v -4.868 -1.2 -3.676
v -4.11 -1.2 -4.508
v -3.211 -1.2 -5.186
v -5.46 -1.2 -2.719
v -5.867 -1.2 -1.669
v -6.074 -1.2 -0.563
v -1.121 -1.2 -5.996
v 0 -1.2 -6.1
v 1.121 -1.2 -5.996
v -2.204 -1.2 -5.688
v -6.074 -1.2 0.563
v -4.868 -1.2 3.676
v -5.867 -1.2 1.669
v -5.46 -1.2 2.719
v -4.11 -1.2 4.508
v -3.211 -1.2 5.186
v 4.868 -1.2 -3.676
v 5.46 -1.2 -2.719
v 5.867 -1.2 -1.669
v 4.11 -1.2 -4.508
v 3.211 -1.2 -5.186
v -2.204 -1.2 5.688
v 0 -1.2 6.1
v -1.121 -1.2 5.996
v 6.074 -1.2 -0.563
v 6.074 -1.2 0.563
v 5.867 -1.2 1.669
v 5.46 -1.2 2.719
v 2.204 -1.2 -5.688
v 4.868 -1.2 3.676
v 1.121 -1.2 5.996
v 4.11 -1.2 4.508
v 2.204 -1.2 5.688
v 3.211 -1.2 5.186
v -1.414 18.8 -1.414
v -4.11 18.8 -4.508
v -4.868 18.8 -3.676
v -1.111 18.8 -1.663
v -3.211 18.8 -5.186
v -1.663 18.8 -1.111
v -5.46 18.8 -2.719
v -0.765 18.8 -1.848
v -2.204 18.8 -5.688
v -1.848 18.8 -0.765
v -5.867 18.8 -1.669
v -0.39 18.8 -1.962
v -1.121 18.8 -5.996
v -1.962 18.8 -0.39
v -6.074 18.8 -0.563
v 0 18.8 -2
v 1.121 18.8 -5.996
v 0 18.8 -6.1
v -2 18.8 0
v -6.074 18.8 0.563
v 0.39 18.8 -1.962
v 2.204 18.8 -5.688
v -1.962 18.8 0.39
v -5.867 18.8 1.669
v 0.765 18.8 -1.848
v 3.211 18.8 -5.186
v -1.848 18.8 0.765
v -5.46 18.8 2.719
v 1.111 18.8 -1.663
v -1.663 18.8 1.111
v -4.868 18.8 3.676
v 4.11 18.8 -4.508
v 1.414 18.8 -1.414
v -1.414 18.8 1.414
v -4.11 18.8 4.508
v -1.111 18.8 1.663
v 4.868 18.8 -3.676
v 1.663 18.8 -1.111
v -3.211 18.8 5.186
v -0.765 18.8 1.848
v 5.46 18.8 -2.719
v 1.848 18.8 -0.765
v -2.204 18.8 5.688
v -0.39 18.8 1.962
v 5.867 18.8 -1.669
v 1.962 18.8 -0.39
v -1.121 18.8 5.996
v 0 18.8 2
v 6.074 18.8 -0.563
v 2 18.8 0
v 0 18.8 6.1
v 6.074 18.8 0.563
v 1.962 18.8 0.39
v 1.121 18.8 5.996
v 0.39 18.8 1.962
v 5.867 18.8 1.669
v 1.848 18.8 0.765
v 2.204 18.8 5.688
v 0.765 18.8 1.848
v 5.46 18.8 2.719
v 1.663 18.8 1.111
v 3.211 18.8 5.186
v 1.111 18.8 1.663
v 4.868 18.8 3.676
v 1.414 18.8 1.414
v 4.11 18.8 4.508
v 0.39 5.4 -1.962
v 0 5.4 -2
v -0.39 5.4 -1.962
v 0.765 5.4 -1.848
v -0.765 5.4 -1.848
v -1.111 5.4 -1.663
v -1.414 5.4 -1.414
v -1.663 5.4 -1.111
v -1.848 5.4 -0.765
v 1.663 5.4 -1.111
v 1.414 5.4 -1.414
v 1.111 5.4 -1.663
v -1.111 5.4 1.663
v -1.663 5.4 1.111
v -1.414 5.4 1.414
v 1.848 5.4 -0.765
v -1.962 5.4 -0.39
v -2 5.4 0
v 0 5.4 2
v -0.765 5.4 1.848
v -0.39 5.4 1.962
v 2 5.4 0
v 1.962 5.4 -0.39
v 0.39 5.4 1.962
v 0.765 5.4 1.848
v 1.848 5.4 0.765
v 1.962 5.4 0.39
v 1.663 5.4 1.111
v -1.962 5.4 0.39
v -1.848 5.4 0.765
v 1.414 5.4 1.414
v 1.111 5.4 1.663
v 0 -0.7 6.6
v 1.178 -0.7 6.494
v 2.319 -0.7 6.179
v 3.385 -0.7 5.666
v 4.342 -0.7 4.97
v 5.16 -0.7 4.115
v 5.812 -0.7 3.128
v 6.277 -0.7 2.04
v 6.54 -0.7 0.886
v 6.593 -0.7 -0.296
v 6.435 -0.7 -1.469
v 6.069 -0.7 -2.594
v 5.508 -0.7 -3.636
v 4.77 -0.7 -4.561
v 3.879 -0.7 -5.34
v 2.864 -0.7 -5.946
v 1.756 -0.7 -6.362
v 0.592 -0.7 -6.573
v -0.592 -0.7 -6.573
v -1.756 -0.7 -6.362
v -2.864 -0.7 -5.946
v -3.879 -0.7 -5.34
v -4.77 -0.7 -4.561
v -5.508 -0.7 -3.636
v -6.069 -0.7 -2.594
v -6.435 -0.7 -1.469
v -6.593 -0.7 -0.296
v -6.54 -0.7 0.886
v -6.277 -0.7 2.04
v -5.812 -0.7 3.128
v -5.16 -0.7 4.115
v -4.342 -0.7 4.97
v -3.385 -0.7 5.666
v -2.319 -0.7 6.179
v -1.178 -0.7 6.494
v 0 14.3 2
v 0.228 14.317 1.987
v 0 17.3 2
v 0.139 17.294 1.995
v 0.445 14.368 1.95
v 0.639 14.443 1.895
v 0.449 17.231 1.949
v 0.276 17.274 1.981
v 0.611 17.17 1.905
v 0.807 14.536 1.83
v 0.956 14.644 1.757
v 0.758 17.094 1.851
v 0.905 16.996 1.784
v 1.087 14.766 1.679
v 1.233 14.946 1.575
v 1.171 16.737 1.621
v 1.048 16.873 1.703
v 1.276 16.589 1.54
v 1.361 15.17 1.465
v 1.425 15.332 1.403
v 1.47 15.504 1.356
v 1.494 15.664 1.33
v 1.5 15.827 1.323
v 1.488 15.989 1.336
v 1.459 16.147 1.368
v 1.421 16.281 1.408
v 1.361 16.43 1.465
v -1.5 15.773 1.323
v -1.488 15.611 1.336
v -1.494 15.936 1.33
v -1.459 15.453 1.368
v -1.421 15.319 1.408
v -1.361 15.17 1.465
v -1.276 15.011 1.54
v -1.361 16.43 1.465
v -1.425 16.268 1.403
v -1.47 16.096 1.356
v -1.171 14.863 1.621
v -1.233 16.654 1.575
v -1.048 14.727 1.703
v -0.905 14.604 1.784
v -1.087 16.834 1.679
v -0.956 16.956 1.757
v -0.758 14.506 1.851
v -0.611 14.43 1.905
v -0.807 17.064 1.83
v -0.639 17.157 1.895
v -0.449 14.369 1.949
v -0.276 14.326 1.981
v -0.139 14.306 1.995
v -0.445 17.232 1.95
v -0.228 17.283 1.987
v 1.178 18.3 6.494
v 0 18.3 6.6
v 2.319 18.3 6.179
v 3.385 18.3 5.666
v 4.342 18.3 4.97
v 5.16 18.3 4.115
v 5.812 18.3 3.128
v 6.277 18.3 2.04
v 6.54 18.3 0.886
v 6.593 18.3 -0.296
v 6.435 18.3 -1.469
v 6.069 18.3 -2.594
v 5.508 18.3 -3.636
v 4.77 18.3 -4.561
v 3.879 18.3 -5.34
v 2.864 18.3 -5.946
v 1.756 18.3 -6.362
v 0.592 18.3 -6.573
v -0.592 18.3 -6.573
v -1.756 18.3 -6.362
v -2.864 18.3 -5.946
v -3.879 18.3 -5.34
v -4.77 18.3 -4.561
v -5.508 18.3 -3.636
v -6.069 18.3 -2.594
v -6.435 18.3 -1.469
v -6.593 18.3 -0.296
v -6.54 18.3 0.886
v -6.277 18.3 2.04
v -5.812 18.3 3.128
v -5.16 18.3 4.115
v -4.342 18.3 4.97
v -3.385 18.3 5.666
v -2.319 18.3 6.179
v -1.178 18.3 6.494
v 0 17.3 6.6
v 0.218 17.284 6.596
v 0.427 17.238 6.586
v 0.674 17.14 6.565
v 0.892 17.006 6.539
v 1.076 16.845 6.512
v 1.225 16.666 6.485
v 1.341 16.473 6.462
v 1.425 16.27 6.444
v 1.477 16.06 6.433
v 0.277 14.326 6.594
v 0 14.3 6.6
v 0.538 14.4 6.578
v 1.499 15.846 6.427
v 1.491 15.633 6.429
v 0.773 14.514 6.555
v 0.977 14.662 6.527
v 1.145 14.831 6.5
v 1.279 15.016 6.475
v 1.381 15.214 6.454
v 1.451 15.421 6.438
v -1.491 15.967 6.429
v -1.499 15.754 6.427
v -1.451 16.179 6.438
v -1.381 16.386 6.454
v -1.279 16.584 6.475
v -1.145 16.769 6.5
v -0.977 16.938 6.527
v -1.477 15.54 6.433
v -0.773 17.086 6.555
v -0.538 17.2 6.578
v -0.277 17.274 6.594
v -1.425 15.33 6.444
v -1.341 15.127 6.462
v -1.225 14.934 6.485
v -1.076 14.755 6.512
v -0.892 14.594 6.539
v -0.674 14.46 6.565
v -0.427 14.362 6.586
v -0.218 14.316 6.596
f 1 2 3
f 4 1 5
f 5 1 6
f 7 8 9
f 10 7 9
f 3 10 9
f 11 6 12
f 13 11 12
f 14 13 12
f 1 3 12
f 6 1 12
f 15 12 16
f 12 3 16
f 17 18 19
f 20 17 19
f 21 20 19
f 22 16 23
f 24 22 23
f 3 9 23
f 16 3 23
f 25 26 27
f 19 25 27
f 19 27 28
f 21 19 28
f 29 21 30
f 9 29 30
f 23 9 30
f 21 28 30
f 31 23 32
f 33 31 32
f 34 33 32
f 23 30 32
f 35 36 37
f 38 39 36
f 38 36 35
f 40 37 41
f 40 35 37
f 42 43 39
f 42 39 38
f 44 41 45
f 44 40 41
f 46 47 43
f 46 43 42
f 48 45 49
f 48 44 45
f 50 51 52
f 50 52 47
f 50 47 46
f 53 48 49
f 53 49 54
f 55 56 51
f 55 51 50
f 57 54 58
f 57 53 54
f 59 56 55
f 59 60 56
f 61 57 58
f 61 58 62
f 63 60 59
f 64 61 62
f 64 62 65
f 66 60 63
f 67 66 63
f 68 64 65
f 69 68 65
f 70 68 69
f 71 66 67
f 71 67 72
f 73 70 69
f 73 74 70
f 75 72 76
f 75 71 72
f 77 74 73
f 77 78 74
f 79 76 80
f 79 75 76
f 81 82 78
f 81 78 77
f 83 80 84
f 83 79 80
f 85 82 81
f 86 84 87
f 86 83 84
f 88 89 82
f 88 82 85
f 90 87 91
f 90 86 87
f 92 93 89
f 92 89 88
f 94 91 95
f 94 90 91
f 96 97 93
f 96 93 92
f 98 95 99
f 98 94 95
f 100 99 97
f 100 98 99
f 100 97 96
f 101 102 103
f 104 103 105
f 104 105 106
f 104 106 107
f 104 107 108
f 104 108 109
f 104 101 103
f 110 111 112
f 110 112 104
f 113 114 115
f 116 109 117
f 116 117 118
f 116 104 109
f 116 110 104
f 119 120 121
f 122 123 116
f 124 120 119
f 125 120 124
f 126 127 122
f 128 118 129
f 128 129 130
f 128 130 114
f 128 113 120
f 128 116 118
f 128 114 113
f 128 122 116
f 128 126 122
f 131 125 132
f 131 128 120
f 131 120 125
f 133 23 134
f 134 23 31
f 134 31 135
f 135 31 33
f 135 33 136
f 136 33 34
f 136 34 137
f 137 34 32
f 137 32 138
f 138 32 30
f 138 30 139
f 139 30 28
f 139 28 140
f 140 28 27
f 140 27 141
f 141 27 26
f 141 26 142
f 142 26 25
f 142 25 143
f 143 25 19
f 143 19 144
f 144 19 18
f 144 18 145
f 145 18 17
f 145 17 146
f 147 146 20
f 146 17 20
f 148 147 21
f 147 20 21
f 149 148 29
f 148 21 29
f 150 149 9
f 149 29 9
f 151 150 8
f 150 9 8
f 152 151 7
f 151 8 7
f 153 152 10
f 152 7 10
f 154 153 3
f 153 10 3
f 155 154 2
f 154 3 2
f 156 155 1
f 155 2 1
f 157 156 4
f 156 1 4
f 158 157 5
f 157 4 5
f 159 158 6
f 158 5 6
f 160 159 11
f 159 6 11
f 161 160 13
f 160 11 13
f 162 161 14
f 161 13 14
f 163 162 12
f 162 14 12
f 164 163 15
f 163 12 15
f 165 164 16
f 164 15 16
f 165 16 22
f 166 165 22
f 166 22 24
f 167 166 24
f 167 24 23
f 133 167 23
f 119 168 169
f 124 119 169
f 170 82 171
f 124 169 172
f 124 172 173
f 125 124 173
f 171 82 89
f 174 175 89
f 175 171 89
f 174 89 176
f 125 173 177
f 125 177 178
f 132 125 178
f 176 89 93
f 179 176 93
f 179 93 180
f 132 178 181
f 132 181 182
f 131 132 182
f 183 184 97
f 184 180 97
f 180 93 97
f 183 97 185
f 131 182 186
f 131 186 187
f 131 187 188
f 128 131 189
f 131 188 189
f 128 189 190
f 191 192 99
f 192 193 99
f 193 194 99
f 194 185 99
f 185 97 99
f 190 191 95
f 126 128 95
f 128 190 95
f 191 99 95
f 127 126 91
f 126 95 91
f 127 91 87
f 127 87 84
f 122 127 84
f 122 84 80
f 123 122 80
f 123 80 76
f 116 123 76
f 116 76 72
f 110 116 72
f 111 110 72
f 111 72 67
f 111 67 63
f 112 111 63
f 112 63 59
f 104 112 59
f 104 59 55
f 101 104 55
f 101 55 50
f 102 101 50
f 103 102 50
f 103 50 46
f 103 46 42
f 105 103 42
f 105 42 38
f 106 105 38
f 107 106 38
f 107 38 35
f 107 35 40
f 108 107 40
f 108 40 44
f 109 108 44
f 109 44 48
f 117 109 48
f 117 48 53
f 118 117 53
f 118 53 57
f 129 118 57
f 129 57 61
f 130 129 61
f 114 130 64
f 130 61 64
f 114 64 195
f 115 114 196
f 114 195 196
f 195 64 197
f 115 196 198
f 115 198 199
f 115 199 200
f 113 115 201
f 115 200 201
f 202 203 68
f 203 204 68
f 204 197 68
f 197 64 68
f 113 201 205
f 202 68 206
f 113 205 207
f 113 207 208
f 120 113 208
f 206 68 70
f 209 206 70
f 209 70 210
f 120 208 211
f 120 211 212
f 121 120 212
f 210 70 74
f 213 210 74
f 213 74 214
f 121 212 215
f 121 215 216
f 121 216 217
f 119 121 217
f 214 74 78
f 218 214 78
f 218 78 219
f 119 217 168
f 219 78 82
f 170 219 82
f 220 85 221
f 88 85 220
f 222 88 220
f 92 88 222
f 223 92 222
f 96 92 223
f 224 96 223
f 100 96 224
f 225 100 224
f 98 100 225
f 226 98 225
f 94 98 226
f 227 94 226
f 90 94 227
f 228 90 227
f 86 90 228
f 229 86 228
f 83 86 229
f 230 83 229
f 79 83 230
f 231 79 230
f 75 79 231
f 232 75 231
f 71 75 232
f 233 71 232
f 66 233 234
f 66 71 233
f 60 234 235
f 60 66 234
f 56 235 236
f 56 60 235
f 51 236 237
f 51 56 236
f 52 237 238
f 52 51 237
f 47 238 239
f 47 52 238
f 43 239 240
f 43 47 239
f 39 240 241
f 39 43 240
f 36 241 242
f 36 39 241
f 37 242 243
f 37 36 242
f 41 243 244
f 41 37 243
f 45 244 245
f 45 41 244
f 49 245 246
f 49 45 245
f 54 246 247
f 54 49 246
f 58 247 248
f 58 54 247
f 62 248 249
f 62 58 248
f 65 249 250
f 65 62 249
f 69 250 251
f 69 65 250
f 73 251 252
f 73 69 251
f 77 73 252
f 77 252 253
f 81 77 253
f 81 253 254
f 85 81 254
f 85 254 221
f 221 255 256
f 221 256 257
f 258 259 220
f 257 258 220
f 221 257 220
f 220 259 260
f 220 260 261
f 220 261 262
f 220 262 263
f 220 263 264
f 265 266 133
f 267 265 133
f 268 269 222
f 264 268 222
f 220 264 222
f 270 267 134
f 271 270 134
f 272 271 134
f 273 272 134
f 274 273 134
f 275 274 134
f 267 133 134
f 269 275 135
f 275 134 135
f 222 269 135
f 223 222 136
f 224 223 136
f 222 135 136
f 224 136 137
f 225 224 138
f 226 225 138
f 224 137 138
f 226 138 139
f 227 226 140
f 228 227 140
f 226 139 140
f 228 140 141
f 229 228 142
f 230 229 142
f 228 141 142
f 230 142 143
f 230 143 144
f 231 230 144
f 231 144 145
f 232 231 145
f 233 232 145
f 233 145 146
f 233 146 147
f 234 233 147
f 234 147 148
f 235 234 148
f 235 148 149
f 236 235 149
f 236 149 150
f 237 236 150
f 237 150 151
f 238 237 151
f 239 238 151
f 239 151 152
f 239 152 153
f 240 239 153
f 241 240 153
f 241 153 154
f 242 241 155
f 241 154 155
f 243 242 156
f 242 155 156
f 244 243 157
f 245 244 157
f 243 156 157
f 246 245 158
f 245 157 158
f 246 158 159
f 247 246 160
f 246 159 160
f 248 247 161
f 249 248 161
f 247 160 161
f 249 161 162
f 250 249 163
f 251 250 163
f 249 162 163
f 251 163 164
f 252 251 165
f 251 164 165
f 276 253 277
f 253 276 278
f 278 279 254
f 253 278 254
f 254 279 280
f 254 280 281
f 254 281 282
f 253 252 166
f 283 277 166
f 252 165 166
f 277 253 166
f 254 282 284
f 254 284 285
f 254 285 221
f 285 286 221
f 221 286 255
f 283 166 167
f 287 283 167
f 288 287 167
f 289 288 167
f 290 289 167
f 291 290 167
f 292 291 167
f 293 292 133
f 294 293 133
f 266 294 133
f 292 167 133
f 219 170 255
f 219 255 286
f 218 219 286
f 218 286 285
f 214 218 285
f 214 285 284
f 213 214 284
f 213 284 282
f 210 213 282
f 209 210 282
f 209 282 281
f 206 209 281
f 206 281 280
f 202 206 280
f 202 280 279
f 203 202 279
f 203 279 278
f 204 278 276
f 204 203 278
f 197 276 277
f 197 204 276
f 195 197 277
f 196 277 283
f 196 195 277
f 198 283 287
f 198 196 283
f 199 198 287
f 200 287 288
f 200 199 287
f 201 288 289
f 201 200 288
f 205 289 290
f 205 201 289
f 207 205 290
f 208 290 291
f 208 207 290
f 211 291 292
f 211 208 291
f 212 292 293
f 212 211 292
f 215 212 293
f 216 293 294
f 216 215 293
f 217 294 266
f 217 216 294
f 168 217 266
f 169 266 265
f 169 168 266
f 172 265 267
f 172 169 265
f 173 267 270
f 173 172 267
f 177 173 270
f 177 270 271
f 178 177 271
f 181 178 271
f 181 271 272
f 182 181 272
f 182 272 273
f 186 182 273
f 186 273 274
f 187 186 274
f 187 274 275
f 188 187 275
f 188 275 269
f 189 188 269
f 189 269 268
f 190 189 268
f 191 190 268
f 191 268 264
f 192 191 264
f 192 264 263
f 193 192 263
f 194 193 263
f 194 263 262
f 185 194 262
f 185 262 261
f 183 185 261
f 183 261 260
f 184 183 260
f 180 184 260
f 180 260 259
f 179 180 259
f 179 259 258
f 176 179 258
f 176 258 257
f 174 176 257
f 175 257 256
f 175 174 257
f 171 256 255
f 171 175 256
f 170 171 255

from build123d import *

# Parameters (mm, degrees)
EXTRUDE_1_DEPTH      = 18.8
EXTRUDE_1_DEPTH_BACK = 1.2
SKETCH_1_R           = 6.6
CHAMFER_1_SIZE       = 0.5
SKETCH_2_R           = 2
CUT_EXTRUDE_1_DEPTH  = 13.4
SKETCH_3_R           = 1.5
CUT_EXTRUDE_2_DEPTH  = 13.4


with BuildPart() as part:
    # 草图1 → 凸台-拉伸1 (new, two sides: drawn at the far end of the back side and taken through both)
    with BuildSketch(Plane(origin=(0, 0, 0), x_dir=(1, 0, 0), z_dir=(0, 1, 0)).offset(-EXTRUDE_1_DEPTH_BACK)):
        with Locations(Location((0, 0, 0), (0, 0, 270))):
            Circle(SKETCH_1_R)
    extrude(amount=EXTRUDE_1_DEPTH + EXTRUDE_1_DEPTH_BACK)

    # 倒角1
    chamfer_1_edges = [part.edges().sort_by_distance(p)[0] for p in [
        (0, -1.2, -6.6),
        (0, 18.8, -6.6),
    ]]
    chamfer(chamfer_1_edges, length=CHAMFER_1_SIZE)

    # 草图2 → 切除-拉伸1 (cut)
    with BuildSketch(Plane(origin=(0, 18.8, 0), x_dir=(1, 0, 0), z_dir=(0, 1, 0))):
        with Locations(Location((0, 0, 0), (0, 0, 270))):
            Circle(SKETCH_2_R)
    extrude(amount=-CUT_EXTRUDE_1_DEPTH, mode=Mode.SUBTRACT)

    # 草图3 → 切除-拉伸2 (cut)
    with BuildSketch(Plane.XY):
        with Locations(Location((0, 15.8, 0), (0, 0, 90))):
            Circle(SKETCH_3_R)
    extrude(amount=CUT_EXTRUDE_2_DEPTH, mode=Mode.SUBTRACT)


solid = part.part
